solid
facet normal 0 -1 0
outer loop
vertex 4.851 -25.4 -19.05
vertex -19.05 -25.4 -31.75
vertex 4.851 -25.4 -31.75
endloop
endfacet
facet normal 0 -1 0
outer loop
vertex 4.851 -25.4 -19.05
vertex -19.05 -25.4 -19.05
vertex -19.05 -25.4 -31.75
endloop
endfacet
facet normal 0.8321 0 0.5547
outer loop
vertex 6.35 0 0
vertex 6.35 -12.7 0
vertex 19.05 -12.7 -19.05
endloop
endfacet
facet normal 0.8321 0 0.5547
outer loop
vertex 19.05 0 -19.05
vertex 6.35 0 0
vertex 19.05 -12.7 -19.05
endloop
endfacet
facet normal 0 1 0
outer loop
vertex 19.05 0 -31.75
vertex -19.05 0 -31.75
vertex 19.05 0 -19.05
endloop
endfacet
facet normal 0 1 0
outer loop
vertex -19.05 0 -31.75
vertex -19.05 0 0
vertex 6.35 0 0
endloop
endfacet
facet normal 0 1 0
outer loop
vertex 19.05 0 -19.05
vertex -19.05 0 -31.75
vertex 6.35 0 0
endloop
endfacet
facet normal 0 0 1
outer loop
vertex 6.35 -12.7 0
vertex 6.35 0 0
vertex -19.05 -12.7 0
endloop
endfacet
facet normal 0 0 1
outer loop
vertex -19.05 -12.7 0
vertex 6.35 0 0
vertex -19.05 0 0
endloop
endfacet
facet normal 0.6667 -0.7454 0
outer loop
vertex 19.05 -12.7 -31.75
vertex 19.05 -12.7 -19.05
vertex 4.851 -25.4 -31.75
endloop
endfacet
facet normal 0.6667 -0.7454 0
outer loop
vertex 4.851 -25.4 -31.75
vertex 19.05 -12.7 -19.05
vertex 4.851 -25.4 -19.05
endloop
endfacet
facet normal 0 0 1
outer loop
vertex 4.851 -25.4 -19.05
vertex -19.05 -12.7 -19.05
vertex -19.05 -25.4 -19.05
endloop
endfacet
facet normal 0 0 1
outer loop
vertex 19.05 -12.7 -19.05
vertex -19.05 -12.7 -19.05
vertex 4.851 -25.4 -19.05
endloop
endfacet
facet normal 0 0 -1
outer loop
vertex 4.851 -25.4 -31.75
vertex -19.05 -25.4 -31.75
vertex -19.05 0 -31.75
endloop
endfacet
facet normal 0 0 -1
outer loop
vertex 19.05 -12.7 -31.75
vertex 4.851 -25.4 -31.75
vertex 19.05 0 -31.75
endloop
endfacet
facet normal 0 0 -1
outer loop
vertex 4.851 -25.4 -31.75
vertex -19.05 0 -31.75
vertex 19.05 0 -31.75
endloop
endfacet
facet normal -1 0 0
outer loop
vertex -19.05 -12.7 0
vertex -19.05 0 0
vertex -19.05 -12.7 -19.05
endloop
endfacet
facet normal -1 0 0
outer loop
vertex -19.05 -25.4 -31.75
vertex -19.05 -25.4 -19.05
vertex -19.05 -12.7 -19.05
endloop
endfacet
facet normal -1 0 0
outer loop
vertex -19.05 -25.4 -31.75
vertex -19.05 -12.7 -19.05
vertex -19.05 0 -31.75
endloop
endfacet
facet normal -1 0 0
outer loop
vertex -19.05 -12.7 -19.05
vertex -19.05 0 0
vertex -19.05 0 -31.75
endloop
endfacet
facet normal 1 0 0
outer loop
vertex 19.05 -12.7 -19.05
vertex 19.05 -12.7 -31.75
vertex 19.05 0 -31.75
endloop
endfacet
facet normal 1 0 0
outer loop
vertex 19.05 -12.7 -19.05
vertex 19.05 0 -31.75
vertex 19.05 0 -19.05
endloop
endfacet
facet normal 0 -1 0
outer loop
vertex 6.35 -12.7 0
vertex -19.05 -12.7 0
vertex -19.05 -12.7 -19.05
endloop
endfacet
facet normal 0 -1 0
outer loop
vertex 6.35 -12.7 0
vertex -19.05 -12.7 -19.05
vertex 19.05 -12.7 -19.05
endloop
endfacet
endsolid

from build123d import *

# Parameters (mm, degrees)
F1_DEPTH = 25.4
F2_W     = 38.1
F2_H     = 12.7
F3_DEPTH = 19.05
F5_DEPTH = 25.4
F7_DEPTH = 25.4


with BuildPart() as f1:
    # F0 (on Front) → F1 (new body)
    with BuildSketch(Plane.XZ):
        Polygon((19.05, 0), (0, 0), (-19.05, 0), (-19.05, -31.75), (19.05, -31.75), align=None)
    extrude(amount=F1_DEPTH)

    # F2 (on face) → F3 (cut)
    with BuildSketch(Plane.XY):
        with Locations((0, -19.05)):
            Rectangle(F2_W, F2_H)
    extrude(amount=-F3_DEPTH, mode=Mode.SUBTRACT)

    # F4 (on face) → F5 (cut)
    with BuildSketch(Plane.XY.offset(-19.05)):
        Polygon((19.05, -25.4), (19.05, -12.7), (4.850968, -25.4), align=None)
    extrude(amount=-F5_DEPTH, mode=Mode.SUBTRACT)

    # F6 (on face) → F7 (cut)
    with BuildSketch(Plane.XZ.offset(12.7)):
        Polygon((19.05, -19.05), (19.05, 0), (6.35, 0), align=None)
    extrude(amount=-F7_DEPTH, mode=Mode.SUBTRACT)


solid = f1.part
